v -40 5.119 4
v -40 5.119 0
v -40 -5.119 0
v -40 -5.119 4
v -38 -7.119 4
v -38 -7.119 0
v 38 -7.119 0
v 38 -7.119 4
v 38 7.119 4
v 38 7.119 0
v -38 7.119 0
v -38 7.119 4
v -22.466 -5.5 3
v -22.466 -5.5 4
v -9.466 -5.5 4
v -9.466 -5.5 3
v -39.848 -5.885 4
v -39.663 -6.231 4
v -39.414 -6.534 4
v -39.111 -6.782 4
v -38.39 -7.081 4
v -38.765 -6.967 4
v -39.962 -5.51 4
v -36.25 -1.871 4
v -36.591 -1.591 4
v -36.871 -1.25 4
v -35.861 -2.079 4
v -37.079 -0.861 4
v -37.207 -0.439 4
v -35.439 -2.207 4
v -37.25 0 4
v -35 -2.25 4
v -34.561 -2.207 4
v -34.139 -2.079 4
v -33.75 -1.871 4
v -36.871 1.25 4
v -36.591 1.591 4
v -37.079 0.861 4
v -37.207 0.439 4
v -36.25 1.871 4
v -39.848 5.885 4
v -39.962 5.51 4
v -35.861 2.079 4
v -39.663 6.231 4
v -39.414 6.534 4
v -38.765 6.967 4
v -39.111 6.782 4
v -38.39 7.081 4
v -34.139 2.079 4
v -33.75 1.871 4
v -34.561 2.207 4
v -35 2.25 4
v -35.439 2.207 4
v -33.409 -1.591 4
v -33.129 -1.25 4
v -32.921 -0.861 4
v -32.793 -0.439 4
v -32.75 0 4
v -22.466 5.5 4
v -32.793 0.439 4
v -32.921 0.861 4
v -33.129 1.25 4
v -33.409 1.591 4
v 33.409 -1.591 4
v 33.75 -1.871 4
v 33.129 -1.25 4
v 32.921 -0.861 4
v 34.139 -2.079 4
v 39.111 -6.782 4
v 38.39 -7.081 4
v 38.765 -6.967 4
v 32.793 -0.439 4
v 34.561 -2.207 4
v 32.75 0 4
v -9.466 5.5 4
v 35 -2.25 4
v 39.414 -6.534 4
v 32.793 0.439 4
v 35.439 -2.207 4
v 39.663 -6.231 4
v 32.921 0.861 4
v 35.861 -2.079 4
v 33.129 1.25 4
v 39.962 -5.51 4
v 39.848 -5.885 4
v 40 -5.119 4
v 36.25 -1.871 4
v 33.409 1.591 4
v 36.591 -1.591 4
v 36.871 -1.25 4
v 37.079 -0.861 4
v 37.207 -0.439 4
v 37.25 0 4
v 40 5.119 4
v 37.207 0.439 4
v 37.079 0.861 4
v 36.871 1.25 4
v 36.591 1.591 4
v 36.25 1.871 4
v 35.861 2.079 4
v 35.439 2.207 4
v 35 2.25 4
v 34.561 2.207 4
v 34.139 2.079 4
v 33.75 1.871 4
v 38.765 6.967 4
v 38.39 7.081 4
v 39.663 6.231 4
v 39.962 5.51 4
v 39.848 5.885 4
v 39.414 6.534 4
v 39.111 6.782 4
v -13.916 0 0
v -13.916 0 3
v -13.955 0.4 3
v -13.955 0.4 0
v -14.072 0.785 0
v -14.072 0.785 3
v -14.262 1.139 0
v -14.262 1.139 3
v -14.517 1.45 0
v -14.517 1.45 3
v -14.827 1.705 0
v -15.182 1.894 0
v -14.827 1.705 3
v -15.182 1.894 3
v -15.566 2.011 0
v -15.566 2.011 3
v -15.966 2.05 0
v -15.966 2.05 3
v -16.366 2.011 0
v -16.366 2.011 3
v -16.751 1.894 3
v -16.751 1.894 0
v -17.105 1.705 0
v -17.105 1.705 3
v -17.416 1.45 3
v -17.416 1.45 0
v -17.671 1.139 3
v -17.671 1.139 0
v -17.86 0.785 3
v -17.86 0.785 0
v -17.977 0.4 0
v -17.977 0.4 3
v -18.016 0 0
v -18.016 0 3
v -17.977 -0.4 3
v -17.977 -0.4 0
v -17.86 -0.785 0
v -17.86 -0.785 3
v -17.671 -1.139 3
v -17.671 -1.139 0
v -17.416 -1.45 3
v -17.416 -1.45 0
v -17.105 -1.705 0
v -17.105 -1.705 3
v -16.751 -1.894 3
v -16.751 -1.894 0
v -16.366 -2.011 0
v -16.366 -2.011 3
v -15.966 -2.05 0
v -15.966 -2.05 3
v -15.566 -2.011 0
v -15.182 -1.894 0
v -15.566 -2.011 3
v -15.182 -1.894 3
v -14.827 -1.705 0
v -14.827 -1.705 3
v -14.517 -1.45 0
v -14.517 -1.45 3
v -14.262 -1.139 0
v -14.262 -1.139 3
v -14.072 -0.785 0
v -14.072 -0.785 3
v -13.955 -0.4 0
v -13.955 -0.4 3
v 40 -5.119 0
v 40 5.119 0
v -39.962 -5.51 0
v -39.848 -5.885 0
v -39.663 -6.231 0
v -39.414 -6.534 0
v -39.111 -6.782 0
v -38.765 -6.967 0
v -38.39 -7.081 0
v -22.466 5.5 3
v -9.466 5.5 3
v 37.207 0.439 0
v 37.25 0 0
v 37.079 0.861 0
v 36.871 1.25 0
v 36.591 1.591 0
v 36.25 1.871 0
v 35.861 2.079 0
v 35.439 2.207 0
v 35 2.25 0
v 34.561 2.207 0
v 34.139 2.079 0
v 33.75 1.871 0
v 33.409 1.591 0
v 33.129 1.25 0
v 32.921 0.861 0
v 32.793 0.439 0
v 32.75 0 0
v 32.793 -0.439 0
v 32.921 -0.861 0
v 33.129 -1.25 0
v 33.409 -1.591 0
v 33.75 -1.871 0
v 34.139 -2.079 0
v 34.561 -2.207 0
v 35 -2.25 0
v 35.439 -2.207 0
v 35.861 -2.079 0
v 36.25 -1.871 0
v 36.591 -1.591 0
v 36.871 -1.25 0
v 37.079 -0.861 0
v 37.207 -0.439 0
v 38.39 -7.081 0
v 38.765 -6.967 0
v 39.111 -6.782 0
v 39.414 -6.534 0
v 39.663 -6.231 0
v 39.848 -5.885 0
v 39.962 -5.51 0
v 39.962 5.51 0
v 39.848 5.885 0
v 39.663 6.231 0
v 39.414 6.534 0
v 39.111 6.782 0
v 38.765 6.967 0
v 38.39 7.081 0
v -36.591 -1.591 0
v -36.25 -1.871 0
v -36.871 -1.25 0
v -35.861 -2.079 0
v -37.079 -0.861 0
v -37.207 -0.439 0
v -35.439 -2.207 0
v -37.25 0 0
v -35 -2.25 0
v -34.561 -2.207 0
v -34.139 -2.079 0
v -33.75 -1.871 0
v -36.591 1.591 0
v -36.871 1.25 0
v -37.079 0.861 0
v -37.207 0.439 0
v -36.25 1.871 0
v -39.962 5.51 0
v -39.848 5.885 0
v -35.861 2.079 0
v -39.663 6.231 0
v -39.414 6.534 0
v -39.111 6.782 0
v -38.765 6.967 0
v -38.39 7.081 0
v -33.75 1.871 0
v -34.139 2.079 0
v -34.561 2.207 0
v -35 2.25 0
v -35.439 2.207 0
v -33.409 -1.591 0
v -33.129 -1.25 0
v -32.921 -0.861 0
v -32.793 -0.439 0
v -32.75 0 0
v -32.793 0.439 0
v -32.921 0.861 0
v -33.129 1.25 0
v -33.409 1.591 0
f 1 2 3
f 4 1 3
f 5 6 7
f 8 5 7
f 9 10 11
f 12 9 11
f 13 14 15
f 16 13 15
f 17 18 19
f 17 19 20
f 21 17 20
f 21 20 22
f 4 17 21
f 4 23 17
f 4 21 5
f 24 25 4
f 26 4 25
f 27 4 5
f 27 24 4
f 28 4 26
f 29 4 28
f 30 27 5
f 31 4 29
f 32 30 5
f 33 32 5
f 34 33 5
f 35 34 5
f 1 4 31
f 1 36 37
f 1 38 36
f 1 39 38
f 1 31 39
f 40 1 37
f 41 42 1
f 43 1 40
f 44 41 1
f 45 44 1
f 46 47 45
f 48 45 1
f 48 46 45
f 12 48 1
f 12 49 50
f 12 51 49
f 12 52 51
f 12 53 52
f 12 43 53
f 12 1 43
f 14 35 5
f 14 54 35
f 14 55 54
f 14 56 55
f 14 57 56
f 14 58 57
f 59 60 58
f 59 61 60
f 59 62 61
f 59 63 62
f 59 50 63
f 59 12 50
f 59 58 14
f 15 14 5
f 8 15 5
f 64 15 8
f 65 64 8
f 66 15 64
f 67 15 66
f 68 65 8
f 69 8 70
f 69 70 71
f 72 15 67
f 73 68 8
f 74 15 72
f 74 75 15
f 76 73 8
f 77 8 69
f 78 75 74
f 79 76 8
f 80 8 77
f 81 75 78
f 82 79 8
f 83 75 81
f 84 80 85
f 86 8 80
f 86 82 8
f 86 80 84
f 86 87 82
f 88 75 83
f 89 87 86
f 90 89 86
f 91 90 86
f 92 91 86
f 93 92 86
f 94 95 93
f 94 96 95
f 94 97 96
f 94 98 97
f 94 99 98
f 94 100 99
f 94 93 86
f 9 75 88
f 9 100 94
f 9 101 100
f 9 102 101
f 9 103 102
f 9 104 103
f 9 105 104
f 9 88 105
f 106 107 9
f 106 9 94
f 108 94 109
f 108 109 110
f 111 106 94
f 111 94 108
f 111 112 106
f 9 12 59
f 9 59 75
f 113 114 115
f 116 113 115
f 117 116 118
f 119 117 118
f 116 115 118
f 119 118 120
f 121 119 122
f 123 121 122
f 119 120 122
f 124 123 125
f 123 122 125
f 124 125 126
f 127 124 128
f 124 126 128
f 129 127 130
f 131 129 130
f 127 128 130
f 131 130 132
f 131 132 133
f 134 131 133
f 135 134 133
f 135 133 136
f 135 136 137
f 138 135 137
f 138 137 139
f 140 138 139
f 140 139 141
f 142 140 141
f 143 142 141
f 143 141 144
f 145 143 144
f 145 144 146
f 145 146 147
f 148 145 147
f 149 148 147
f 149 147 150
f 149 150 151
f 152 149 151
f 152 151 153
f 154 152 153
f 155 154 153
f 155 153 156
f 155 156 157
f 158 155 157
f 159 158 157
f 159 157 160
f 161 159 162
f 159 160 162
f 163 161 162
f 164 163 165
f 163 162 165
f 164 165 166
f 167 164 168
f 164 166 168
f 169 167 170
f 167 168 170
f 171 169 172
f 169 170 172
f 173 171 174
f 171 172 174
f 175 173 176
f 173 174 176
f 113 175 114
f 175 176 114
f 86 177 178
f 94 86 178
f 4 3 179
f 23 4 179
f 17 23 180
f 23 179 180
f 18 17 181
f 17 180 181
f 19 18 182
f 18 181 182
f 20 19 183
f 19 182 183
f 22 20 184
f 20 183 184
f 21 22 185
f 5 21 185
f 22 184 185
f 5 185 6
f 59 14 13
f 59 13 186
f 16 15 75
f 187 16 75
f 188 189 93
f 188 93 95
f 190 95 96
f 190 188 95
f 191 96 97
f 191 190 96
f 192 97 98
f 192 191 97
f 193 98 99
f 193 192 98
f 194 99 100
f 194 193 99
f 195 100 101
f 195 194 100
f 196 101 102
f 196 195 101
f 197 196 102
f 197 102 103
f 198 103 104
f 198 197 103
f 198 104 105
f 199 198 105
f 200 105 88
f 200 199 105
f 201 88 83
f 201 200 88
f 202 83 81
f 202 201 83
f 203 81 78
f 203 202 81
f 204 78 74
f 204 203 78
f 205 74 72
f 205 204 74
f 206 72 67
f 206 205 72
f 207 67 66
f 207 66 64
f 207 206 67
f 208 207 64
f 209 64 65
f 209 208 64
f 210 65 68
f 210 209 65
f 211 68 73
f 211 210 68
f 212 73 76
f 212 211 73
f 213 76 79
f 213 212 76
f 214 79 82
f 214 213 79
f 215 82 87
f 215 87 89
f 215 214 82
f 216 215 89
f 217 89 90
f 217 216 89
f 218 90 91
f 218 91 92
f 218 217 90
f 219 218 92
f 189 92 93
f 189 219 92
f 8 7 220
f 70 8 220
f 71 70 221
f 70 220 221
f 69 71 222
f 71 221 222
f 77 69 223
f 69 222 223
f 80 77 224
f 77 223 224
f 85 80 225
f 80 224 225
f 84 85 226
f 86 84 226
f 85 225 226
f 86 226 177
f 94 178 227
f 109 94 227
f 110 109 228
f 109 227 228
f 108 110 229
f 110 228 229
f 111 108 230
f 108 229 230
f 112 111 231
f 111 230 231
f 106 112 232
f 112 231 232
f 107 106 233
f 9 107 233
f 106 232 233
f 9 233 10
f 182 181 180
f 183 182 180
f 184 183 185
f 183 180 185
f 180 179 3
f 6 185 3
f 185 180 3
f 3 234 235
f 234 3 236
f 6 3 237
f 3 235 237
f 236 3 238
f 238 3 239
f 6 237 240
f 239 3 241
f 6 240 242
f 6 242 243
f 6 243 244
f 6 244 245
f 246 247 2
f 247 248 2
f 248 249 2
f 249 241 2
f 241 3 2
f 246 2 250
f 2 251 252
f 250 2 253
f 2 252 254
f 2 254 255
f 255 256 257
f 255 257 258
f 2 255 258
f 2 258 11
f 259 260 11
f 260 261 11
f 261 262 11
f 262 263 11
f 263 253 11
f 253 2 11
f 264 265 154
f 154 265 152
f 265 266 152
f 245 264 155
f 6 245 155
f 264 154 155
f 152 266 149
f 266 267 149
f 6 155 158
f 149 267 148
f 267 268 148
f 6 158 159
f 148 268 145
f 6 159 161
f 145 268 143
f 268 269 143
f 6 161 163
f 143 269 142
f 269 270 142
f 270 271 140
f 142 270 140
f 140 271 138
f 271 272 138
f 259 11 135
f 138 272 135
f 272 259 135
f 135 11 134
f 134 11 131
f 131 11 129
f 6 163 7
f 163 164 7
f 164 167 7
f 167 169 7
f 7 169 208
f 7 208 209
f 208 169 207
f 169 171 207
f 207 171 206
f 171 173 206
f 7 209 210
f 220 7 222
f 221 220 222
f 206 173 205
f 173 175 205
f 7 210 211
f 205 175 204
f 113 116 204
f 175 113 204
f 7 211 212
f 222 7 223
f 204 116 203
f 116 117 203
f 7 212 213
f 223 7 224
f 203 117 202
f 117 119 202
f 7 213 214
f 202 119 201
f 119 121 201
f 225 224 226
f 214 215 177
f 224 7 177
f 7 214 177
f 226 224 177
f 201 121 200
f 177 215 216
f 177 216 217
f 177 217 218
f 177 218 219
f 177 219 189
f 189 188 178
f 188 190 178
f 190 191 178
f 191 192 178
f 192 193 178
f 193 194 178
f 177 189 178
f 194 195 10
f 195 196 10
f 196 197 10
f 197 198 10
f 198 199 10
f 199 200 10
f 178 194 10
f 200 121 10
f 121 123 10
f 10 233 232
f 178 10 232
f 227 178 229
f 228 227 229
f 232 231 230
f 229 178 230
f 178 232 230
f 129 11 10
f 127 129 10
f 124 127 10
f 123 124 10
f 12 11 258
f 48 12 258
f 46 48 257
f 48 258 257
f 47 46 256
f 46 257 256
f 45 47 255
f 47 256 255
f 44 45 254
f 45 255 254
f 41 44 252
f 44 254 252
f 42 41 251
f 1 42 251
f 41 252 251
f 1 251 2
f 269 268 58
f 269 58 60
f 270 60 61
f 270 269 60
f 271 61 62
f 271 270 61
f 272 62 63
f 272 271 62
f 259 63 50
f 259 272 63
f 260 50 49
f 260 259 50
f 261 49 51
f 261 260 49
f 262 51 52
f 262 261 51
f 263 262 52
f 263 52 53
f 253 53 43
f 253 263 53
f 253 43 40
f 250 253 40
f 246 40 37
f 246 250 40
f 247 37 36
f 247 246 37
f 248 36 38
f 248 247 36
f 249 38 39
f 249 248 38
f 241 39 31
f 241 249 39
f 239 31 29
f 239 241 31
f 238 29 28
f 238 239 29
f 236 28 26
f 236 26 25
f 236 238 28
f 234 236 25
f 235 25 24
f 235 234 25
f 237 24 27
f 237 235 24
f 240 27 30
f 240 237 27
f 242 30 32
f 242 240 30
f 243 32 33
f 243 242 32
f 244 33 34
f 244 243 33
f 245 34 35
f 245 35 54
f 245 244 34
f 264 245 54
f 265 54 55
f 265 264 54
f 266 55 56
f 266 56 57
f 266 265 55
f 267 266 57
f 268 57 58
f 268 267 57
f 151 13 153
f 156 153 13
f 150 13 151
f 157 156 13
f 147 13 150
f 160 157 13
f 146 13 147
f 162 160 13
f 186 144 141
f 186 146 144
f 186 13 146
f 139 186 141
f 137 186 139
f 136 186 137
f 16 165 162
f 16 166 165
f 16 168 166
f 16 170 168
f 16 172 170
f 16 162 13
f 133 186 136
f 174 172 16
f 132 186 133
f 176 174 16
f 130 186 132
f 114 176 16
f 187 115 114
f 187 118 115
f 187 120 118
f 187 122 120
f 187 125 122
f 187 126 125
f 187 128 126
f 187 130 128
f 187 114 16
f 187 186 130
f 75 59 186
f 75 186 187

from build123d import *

# Parameters (mm, degrees)
F0_R     = 2.25
F1_DEPTH = 4
F2_R     = 2.05
F3_DEPTH = 5
F4_W     = 13
F4_H     = 11
F5_DEPTH = 1


with BuildPart() as f1:
    # F0 (on Top) → F1 (new body)
    with BuildSketch(Plane.XY):
        with BuildLine():
            ThreePointArc((40, 5.119438), (39.414214, 6.533651), (38, 7.119438))
            Line((38, 7.119438), (-38, 7.119438))
            ThreePointArc((-38, 7.119438), (-39.414214, 6.533651), (-40, 5.119438))
            Line((-40, 5.119438), (-40, -5.119438))
            ThreePointArc((-40, -5.119438), (-39.414214, -6.533651), (-38, -7.119438))
            Line((-38, -7.119438), (38, -7.119438))
            ThreePointArc((38, -7.119438), (39.414214, -6.533651), (40, -5.119438))
            Line((40, -5.119438), (40, 5.119438))
        make_face()
        with Locations((-35, 0)):
            Circle(F0_R, mode=Mode.SUBTRACT)
        with Locations((35, 0)):
            Circle(F0_R, mode=Mode.SUBTRACT)
    extrude(amount=F1_DEPTH)

    # F2 (on face) → F3 (cut)
    with BuildSketch(Plane.XY.offset(4)):
        with Locations((-15.9661, 0)):
            Circle(F2_R)
    extrude(amount=-F3_DEPTH, mode=Mode.SUBTRACT)

    # F4 (on face) → F5 (cut)
    with BuildSketch(Plane.XY.offset(4)):
        with Locations((-15.9661, 0)):
            Rectangle(F4_W, F4_H)
    extrude(amount=-F5_DEPTH, mode=Mode.SUBTRACT)


solid = f1.part
